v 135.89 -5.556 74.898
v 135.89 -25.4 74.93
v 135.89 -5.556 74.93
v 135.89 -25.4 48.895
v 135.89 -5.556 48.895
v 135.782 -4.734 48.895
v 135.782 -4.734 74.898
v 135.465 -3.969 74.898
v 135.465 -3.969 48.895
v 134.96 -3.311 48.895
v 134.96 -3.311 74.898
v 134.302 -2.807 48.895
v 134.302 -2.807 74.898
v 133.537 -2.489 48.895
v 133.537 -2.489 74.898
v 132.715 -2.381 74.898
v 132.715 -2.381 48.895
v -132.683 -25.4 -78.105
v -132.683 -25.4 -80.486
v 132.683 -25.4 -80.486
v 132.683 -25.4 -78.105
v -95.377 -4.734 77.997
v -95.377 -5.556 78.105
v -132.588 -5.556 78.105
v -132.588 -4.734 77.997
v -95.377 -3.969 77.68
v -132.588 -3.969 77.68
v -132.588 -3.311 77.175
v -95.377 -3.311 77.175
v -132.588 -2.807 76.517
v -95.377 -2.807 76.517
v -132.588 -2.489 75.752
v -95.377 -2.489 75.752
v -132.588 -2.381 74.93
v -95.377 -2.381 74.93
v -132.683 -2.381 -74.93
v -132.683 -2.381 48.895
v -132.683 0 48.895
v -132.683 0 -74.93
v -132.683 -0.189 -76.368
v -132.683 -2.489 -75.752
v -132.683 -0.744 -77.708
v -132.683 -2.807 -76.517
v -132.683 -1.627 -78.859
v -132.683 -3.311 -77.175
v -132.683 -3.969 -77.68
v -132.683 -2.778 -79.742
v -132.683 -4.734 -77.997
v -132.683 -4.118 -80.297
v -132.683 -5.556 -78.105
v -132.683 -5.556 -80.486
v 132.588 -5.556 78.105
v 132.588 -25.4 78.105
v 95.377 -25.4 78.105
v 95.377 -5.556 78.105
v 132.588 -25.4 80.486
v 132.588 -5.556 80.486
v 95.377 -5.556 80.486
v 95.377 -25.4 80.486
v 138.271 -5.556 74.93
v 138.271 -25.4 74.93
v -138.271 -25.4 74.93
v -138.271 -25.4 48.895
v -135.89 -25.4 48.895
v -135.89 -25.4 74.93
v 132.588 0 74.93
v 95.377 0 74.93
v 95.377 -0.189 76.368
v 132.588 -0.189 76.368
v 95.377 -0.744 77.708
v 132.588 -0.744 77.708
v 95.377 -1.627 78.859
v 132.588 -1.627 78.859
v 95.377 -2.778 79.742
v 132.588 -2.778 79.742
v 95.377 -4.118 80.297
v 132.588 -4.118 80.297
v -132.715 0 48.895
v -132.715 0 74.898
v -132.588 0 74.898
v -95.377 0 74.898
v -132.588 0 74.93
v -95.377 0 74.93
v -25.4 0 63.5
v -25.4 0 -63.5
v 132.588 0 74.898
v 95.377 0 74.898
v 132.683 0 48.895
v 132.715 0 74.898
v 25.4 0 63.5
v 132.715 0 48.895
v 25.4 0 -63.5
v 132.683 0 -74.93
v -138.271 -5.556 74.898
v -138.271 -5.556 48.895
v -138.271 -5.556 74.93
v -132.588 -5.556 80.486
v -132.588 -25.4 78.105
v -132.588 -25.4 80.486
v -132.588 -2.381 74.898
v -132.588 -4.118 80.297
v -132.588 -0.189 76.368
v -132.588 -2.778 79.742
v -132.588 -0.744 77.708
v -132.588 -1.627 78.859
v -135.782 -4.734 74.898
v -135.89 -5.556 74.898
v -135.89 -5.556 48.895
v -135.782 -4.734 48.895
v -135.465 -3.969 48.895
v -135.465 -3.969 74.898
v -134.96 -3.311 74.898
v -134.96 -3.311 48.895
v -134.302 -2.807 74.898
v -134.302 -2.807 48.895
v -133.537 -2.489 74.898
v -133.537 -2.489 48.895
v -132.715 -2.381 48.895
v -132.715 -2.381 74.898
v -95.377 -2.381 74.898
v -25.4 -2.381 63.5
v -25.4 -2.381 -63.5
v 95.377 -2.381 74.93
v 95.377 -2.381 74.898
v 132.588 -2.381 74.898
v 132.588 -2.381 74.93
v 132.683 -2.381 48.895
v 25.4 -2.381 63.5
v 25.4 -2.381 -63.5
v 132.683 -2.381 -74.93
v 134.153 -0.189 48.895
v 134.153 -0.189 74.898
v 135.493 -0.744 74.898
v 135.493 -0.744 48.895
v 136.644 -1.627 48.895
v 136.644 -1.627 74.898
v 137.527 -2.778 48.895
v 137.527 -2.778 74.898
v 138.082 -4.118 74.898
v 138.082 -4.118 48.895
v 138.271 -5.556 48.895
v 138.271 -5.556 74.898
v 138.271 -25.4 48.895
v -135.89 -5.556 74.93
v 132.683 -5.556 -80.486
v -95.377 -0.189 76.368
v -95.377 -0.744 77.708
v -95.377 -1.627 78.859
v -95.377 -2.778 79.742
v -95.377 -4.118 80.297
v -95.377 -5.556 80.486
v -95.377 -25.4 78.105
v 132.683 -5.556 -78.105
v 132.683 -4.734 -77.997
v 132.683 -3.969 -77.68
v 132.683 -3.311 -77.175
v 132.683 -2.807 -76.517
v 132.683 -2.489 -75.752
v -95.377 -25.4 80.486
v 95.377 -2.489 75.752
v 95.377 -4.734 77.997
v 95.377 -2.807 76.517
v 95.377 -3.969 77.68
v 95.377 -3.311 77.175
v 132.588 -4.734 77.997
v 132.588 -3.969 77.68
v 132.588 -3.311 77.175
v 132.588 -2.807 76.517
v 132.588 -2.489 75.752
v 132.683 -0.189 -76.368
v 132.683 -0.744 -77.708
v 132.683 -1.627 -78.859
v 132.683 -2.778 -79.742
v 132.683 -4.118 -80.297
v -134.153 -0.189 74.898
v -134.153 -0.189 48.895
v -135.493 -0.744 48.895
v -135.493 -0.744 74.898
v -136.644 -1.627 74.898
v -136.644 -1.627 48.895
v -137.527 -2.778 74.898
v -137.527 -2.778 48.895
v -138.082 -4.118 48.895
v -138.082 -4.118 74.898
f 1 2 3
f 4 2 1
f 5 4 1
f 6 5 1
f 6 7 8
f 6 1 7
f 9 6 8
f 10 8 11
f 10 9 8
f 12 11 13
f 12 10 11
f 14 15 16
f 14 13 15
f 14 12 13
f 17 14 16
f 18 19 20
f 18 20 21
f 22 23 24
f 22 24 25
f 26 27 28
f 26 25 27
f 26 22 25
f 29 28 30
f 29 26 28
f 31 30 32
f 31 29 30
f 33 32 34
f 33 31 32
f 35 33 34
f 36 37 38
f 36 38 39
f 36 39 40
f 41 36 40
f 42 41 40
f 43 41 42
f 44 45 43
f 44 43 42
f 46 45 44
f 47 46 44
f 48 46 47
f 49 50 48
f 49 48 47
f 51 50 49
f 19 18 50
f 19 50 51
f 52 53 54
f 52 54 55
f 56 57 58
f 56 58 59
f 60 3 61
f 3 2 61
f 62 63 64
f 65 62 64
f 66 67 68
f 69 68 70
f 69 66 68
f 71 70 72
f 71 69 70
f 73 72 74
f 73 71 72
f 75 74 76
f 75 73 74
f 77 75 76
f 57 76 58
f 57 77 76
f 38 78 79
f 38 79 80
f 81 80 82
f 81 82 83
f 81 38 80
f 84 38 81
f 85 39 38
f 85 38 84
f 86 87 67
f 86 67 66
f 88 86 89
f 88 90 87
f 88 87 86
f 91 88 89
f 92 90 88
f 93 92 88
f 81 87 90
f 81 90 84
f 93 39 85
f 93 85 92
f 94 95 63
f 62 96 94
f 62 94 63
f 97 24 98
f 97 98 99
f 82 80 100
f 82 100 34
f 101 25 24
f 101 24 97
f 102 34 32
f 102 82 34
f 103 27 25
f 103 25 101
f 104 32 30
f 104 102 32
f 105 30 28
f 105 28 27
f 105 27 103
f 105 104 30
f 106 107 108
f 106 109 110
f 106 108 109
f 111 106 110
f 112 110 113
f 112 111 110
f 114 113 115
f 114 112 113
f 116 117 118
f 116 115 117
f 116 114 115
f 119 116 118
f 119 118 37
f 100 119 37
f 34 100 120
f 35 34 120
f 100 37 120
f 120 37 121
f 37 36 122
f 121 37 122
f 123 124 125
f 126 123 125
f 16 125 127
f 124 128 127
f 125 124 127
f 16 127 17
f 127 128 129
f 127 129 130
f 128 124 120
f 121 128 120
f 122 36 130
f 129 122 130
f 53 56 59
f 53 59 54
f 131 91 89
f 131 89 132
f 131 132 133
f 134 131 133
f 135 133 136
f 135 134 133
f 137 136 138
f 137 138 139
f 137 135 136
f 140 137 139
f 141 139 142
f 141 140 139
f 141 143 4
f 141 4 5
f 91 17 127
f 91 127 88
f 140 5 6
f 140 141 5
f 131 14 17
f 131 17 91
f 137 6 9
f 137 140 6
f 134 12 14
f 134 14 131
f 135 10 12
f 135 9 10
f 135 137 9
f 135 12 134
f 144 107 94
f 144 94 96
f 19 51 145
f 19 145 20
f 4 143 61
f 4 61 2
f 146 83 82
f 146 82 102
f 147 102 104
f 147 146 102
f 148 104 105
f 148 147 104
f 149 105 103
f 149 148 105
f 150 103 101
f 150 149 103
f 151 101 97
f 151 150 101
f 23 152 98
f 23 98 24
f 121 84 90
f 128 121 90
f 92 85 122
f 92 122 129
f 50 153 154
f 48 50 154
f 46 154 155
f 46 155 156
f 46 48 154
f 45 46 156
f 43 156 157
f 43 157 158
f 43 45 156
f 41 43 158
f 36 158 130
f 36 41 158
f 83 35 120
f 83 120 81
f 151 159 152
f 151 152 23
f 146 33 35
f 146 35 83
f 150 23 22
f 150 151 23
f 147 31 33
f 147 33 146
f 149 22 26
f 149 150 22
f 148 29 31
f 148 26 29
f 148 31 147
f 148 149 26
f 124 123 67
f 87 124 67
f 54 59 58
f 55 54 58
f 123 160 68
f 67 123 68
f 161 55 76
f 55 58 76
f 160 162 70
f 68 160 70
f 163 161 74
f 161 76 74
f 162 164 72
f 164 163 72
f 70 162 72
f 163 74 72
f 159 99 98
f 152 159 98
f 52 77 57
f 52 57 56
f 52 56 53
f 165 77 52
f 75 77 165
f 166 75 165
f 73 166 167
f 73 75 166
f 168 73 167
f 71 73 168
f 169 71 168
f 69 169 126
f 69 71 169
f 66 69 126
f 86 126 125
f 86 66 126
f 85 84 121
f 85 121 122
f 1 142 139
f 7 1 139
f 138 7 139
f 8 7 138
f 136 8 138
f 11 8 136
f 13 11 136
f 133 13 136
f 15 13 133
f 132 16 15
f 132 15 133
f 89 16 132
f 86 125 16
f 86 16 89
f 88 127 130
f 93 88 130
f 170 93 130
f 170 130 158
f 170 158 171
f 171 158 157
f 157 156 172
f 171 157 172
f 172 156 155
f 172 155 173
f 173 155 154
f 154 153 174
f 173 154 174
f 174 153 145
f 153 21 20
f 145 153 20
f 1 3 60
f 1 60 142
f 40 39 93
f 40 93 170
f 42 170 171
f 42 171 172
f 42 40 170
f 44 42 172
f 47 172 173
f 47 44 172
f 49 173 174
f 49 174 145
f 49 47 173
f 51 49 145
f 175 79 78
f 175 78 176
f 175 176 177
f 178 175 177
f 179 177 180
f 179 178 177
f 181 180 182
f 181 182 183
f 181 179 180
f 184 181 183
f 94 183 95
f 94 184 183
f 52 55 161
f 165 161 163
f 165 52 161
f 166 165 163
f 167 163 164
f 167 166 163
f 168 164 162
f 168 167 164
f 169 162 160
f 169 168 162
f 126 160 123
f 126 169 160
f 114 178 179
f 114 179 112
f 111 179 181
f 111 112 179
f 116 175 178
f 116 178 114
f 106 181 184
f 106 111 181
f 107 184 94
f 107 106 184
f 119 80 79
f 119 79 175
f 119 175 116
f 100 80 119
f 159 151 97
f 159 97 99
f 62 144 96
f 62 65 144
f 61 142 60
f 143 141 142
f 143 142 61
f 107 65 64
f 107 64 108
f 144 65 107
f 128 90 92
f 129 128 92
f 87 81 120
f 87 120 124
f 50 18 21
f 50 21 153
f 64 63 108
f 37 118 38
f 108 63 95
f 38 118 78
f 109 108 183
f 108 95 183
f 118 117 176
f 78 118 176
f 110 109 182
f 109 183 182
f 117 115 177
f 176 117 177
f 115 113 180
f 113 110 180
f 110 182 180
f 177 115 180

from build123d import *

# Parameters (mm, degrees)
SKETCH1_W                    = 271.78
SKETCH1_H                    = 156.21
BASE_FLANGE1_DEPTH           = 2.38125
EDGE_FLANGE1_STRIP_W         = 15.875
EDGE_FLANGE1_STRIP_H         = 2.38125
EDGE_FLANGE1_STRIP_CUT_DEPTH = 271.78
EDGE_FLANGE1_DEPTH           = 271.78
EDGE_FLANGE2_STRIP_W         = 15.875
EDGE_FLANGE2_STRIP_H         = 2.38125
EDGE_FLANGE2_STRIP_CUT_DEPTH = 153.035
EDGE_FLANGE2_DEPTH           = 153.035
SKETCH14_W                   = 127
SKETCH14_H                   = 30.097595223
CUT_EXTRUDE1_DEPTH           = 5.588
EDGE_FLANGE3_STRIP_W         = 15.875
EDGE_FLANGE3_STRIP_H         = 2.38125
EDGE_FLANGE3_STRIP_CUT_DEPTH = 153.035
EDGE_FLANGE3_DEPTH           = 153.035
SKETCH18_W                   = 127
SKETCH18_H                   = 45.504454023
CUT_EXTRUDE2_DEPTH           = 5.588
CUT_EXTRUDE3_START           = -3.302
CUT_EXTRUDE3_DEPTH           = 5.68325
CUT_EXTRUDE4_START           = -3.302
CUT_EXTRUDE4_DEPTH           = 5.68325
EDGE_FLANGE4_STRIP_W         = 15.875
EDGE_FLANGE4_STRIP_H         = 2.38125
EDGE_FLANGE4_STRIP_CUT_DEPTH = 265.3665
EDGE_FLANGE4_DEPTH           = 265.3665
SKETCH24_W                   = 190.754
SKETCH24_H                   = 70.532416994
CUT_EXTRUDE5_DEPTH           = 5.588
SKETCH25_W                   = 50.8
SKETCH25_H                   = 127
CUT_EXTRUDE6_DEPTH           = 2.54


# Read off the part's stored shape, not the designer's step: Cut-Extrude3, Cut-Extrude4
# Sheet-metal steps are written as plain solids
with BuildPart() as part:
    # Sketch1 → Base-Flange1 (new body)
    with BuildSketch(Plane(origin=(0, 0, 0), x_dir=(1, 0, 0), z_dir=(0, 1, 0))):
        Rectangle(SKETCH1_W, SKETCH1_H)
    extrude(amount=-BASE_FLANGE1_DEPTH)

    # Edge-Flange1 strip (across the edge) → Edge-Flange1 strip cut (cut)
    with BuildSketch(Plane(origin=(135.89, -2.38125, 78.105), x_dir=(0, 0, -1), z_dir=(-1, 0, 0))):
        with Locations((-4.7625, -1.190625)):
            Rectangle(EDGE_FLANGE1_STRIP_W, EDGE_FLANGE1_STRIP_H)
    extrude(amount=EDGE_FLANGE1_STRIP_CUT_DEPTH, mode=Mode.SUBTRACT)

    # Edge-Flange1 section (across the edge) → Edge-Flange1 (add)
    with BuildSketch(Plane(origin=(135.89, -2.38125, 78.105), x_dir=(0, 0, -1), z_dir=(-1, 0, 0))):
        with BuildLine():
            Line((-2.38125, 3.175), (-2.38125, 23.01875))
            Line((-2.38125, 23.01875), (0, 23.01875))
            Line((0, 23.01875), (0, 3.175))
            ThreePointArc((0, 3.175), (0.92993597, 0.92993597), (3.175, 0))
            Line((3.175, 0), (3.175, -2.38125))
            ThreePointArc((3.175, -2.38125), (-0.753862053, -0.753862053), (-2.38125, 3.175))
        make_face()
    extrude(amount=EDGE_FLANGE1_DEPTH)

    # Edge-Flange2 strip (across the edge) → Edge-Flange2 strip cut (cut)
    with BuildSketch(Plane(origin=(135.89, -2.38125, -78.105), x_dir=(-1, 0, 0), z_dir=(0, 0, 1))):
        with Locations((-4.7625, -1.190625)):
            Rectangle(EDGE_FLANGE2_STRIP_W, EDGE_FLANGE2_STRIP_H)
    extrude(amount=EDGE_FLANGE2_STRIP_CUT_DEPTH, mode=Mode.SUBTRACT)

    # Edge-Flange2 section (across the edge) → Edge-Flange2 (add)
    with BuildSketch(Plane(origin=(135.89, -2.38125, -78.105), x_dir=(-1, 0, 0), z_dir=(0, 0, 1))):
        with BuildLine():
            Line((-2.38125, 3.175), (-2.38125, 23.01875))
            Line((-2.38125, 23.01875), (0, 23.01875))
            Line((0, 23.01875), (0, 3.175))
            ThreePointArc((0, 3.175), (0.92993597, 0.92993597), (3.175, 0))
            Line((3.175, 0), (3.175, -2.38125))
            ThreePointArc((3.175, -2.38125), (-0.753862053, -0.753862053), (-2.38125, 3.175))
        make_face()
    extrude(amount=EDGE_FLANGE2_DEPTH)

    # Sketch14 → Cut-Extrude1 (cut)
    with BuildSketch(Plane(origin=(138.27125, 0, 0), x_dir=(0, 0, -1), z_dir=(1, 0, 0))):
        with Locations((14.605, -10.351202389)):
            Rectangle(SKETCH14_W, SKETCH14_H)
    extrude(amount=-CUT_EXTRUDE1_DEPTH, mode=Mode.SUBTRACT)

    # Edge-Flange3 strip (across the edge) → Edge-Flange3 strip cut (cut)
    with BuildSketch(Plane(origin=(-135.89, -2.38125, 74.93), x_dir=(1, 0, 0), z_dir=(0, 0, -1))):
        with Locations((-4.7625, -1.190625)):
            Rectangle(EDGE_FLANGE3_STRIP_W, EDGE_FLANGE3_STRIP_H)
    extrude(amount=EDGE_FLANGE3_STRIP_CUT_DEPTH, mode=Mode.SUBTRACT)

    # Edge-Flange3 section (across the edge) → Edge-Flange3 (add)
    with BuildSketch(Plane(origin=(-135.89, -2.38125, 74.93), x_dir=(1, 0, 0), z_dir=(0, 0, -1))):
        with BuildLine():
            Line((-2.38125, 3.175), (-2.38125, 23.01875))
            Line((-2.38125, 23.01875), (0, 23.01875))
            Line((0, 23.01875), (0, 3.175))
            ThreePointArc((0, 3.175), (0.92993597, 0.92993597), (3.175, 0))
            Line((3.175, 0), (3.175, -2.38125))
            ThreePointArc((3.175, -2.38125), (-0.753862053, -0.753862053), (-2.38125, 3.175))
        make_face()
    extrude(amount=EDGE_FLANGE3_DEPTH)

    # Sketch18 → Cut-Extrude2 (cut)
    with BuildSketch(Plane.ZY.offset(138.27125)):
        with Locations((-14.605, -2.647772988)):
            Rectangle(SKETCH18_W, SKETCH18_H)
    extrude(amount=-CUT_EXTRUDE2_DEPTH, mode=Mode.SUBTRACT)

    # Cut-Extrude3 outline → Cut-Extrude3 (cut)
    with BuildSketch(Plane.ZY.offset(135.89).offset(CUT_EXTRUDE3_START)):
        with BuildLine():
            Line((74.93, 0), (74.89825, 0))
            Line((74.89825, 0), (74.89825, -5.55625))
            Line((74.89825, -5.55625), (74.93, -5.55625))
            Line((74.93, -5.55625), (74.93, -2.38125))
            ThreePointArc((74.93, -2.38125), (77.17506403, -3.31118597), (78.105, -5.55625))
            Line((78.105, -5.55625), (78.105, -25.4))
            Line((78.105, -25.4), (80.48625, -25.4))
            Line((80.48625, -25.4), (80.48625, -5.55625))
            ThreePointArc((80.48625, -5.55625), (78.858862053, -1.627387947), (74.93, 0))
        make_face()
    extrude(amount=CUT_EXTRUDE3_DEPTH, mode=Mode.SUBTRACT)

    # Cut-Extrude4 outline → Cut-Extrude4 (cut)
    with BuildSketch(Plane(origin=(135.89, 0, 0), x_dir=(0, 0, -1), z_dir=(1, 0, 0)).offset(CUT_EXTRUDE4_START)):
        with BuildLine():
            Line((-74.89825, 0), (-74.93, 0))
            ThreePointArc((-74.93, 0), (-78.858862053, -1.627387947), (-80.48625, -5.55625))
            Line((-80.48625, -5.55625), (-80.48625, -25.4))
            Line((-80.48625, -25.4), (-78.105, -25.4))
            Line((-78.105, -25.4), (-78.105, -5.55625))
            ThreePointArc((-78.105, -5.55625), (-77.17506403, -3.31118597), (-74.93, -2.38125))
            Line((-74.93, -2.38125), (-74.93, -5.55625))
            Line((-74.93, -5.55625), (-74.89825, -5.55625))
            Line((-74.89825, -5.55625), (-74.89825, 0))
        make_face()
    extrude(amount=CUT_EXTRUDE4_DEPTH, mode=Mode.SUBTRACT)

    # Edge-Flange4 strip (across the edge) → Edge-Flange4 strip cut (cut)
    with BuildSketch(Plane(origin=(-132.68325, -2.38125, -78.105), x_dir=(0, 0, 1), z_dir=(1, 0, 0))):
        with Locations((-4.7625, -1.190625)):
            Rectangle(EDGE_FLANGE4_STRIP_W, EDGE_FLANGE4_STRIP_H)
    extrude(amount=EDGE_FLANGE4_STRIP_CUT_DEPTH, mode=Mode.SUBTRACT)

    # Edge-Flange4 section (across the edge) → Edge-Flange4 (add)
    with BuildSketch(Plane(origin=(-132.68325, -2.38125, -78.105), x_dir=(0, 0, 1), z_dir=(1, 0, 0))):
        with BuildLine():
            Line((-2.38125, 3.175), (-2.38125, 23.01875))
            Line((-2.38125, 23.01875), (0, 23.01875))
            Line((0, 23.01875), (0, 3.175))
            ThreePointArc((0, 3.175), (0.92993597, 0.92993597), (3.175, 0))
            Line((3.175, 0), (3.175, -2.38125))
            ThreePointArc((3.175, -2.38125), (-0.753862053, -0.753862053), (-2.38125, 3.175))
        make_face()
    extrude(amount=EDGE_FLANGE4_DEPTH)

    # Sketch24 → Cut-Extrude5 (cut)
    with BuildSketch(Plane.XY.offset(80.48625)):
        Rectangle(SKETCH24_W, SKETCH24_H)
    extrude(amount=-CUT_EXTRUDE5_DEPTH, mode=Mode.SUBTRACT)

    # Sketch25 → Cut-Extrude6 (cut)
    with BuildSketch(Plane(origin=(0, 0, 0), x_dir=(1, 0, 0), z_dir=(0, 1, 0))):
        Rectangle(SKETCH25_W, SKETCH25_H)
    extrude(amount=-CUT_EXTRUDE6_DEPTH, mode=Mode.SUBTRACT)


solid = part.part
